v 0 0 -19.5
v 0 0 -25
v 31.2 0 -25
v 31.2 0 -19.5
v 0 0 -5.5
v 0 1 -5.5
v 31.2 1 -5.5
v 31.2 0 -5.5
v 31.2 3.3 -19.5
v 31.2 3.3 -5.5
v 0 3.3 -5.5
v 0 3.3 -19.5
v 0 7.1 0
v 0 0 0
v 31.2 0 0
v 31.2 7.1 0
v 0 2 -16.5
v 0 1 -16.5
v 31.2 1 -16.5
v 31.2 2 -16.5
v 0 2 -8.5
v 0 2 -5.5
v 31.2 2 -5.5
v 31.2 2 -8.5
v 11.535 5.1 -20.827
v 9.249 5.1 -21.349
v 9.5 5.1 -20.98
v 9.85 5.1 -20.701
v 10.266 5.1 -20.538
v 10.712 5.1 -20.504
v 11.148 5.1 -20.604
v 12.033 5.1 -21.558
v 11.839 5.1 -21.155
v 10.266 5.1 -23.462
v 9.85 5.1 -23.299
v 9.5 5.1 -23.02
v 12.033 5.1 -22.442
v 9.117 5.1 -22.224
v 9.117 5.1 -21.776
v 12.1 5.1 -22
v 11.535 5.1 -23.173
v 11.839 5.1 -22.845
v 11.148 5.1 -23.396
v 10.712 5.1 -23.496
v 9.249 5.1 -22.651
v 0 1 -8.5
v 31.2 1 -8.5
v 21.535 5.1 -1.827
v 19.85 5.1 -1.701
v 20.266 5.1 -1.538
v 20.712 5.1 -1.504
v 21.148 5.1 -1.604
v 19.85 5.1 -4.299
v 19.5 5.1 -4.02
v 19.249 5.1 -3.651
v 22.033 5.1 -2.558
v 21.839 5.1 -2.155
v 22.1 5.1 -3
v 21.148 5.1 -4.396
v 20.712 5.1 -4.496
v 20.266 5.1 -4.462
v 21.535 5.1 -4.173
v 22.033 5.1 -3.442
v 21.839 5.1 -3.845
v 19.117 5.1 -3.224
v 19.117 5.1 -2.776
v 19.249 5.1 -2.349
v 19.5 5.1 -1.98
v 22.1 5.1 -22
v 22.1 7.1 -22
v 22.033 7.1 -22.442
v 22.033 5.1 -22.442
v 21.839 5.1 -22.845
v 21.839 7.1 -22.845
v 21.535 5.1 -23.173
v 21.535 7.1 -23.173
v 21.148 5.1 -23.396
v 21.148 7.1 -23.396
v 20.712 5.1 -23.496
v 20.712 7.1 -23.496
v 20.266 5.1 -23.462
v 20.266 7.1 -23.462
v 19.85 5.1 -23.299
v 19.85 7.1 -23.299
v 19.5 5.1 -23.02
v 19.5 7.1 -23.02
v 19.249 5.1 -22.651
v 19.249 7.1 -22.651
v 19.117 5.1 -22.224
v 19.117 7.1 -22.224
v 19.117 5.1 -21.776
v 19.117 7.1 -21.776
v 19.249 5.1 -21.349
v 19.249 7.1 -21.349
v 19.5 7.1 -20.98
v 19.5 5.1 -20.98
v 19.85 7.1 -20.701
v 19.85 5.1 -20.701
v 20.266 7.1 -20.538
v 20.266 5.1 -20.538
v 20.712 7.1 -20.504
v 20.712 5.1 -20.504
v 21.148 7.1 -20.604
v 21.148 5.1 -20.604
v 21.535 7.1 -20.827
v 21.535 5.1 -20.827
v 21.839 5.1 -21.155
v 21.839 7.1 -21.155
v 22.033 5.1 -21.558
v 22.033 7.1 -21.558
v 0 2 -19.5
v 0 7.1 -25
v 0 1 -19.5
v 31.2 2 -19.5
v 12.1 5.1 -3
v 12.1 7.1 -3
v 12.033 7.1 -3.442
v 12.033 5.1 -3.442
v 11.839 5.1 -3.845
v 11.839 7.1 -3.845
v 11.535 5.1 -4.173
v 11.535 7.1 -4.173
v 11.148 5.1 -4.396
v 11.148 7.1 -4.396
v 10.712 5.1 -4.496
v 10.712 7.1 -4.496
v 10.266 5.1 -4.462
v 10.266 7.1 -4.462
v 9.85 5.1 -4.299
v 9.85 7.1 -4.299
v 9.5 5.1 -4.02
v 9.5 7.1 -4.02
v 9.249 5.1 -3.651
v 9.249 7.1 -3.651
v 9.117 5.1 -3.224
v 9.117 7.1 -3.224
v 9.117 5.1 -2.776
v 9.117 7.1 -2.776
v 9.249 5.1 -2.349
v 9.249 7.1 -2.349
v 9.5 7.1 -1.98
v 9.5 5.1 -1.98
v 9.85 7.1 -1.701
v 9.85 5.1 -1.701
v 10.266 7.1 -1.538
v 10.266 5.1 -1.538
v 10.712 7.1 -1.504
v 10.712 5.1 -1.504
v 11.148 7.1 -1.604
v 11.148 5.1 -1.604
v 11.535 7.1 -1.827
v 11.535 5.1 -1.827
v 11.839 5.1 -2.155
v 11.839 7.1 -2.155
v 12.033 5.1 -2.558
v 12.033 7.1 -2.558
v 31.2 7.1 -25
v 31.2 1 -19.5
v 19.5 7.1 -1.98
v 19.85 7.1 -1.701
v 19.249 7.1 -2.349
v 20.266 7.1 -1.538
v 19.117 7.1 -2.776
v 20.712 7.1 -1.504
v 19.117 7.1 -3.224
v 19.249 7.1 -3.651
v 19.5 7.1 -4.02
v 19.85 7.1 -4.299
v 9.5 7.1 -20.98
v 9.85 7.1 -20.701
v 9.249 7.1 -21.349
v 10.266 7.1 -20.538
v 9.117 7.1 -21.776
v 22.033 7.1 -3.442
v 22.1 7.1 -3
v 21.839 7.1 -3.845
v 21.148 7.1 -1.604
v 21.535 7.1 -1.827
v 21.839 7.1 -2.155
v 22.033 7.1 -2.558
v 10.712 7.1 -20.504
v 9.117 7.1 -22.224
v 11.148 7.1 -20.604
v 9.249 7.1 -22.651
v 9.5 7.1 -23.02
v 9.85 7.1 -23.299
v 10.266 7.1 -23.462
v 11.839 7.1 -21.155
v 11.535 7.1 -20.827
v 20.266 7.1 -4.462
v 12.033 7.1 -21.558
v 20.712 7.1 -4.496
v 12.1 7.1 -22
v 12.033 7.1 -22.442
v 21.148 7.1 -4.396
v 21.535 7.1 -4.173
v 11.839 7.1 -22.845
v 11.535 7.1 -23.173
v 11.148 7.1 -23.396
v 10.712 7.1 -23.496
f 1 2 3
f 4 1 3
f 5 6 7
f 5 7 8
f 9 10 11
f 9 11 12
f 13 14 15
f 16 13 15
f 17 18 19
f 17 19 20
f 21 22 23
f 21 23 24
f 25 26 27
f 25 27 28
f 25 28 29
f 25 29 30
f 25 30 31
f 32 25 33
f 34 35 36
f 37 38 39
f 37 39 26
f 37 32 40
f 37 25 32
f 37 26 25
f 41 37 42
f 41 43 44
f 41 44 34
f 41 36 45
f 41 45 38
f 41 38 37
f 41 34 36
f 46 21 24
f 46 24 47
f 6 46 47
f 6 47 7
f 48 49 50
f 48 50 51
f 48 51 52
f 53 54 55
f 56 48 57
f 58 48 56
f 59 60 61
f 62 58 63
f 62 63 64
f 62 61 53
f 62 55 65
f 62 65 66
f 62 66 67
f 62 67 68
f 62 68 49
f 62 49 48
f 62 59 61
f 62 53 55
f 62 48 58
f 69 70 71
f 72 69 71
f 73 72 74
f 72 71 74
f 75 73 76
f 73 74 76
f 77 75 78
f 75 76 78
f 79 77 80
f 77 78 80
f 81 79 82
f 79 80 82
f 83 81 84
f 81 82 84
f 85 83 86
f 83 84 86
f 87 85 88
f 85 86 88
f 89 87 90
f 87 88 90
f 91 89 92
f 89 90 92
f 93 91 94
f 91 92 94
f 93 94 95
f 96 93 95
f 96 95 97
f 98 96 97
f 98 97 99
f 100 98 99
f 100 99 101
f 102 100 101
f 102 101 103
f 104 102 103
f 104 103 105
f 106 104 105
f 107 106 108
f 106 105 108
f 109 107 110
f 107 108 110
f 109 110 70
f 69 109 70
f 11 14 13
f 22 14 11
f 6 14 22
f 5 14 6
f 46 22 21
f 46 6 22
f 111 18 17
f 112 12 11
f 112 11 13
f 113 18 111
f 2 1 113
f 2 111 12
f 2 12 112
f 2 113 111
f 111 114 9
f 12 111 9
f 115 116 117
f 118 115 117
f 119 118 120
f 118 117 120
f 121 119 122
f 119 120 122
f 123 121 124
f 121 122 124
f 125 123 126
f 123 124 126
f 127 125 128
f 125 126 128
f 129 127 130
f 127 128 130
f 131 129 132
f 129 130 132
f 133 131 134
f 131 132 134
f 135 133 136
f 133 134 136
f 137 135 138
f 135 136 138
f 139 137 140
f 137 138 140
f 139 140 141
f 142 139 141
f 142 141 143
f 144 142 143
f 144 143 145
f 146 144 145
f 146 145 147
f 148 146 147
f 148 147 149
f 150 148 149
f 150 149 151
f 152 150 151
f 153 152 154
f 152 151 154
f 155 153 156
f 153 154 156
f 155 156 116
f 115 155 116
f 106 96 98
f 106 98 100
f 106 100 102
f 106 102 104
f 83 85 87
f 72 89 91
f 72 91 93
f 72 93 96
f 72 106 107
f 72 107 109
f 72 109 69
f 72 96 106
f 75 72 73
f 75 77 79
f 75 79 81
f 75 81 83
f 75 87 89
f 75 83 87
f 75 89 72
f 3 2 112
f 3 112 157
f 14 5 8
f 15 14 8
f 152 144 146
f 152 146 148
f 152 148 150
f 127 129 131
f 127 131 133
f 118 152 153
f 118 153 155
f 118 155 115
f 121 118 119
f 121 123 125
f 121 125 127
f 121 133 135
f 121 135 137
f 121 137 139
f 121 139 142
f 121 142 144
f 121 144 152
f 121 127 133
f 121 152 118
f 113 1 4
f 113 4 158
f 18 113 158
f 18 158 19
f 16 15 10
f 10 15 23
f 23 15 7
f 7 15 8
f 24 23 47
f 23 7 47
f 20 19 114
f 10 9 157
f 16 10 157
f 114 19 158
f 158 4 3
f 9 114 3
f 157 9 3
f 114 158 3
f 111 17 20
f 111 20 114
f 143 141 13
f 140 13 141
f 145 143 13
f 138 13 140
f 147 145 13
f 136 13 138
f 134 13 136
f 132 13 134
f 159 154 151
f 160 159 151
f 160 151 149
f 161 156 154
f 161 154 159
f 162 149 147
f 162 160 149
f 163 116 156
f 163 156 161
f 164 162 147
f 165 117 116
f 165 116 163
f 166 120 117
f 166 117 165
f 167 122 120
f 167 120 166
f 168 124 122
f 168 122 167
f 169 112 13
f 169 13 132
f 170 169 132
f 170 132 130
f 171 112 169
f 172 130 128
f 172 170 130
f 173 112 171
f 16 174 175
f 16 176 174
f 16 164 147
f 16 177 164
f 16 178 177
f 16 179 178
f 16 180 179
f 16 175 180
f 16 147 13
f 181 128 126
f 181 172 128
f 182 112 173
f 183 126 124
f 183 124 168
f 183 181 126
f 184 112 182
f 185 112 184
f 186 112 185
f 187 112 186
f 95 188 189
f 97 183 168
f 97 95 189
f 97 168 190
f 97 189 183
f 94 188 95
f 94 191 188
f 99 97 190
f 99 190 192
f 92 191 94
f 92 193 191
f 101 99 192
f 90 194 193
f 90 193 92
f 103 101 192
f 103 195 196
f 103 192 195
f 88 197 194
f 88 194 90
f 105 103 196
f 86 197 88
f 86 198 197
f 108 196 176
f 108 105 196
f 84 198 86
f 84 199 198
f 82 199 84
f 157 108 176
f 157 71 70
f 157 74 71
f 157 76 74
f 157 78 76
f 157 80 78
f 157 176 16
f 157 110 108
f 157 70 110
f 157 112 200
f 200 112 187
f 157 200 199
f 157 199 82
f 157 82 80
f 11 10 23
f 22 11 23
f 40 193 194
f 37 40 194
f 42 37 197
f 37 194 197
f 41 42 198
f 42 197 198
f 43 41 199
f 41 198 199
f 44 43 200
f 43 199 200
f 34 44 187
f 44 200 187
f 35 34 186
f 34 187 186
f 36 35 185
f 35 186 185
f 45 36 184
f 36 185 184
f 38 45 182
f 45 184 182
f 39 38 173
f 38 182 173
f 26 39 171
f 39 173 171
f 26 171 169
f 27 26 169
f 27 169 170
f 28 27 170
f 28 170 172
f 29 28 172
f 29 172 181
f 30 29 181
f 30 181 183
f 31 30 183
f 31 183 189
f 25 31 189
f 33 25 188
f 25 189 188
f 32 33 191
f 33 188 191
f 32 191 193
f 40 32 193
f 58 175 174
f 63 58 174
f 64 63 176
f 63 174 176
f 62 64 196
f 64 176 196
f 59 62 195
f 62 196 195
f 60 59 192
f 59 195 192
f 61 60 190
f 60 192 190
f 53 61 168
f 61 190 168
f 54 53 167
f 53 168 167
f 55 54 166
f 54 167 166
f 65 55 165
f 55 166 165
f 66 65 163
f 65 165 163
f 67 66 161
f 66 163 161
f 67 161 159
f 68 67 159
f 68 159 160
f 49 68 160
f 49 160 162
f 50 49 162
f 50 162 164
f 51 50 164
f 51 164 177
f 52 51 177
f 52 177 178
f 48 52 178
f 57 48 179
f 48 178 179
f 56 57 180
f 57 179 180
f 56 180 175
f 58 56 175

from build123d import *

# Parameters (mm, degrees)
SKETCH_1_W          = 31.2
SKETCH_1_H          = 25
EXTRUDE_1_DEPTH     = 7.1
CUT_EXTRUDE_1_DEPTH = 50.9
SKETCH_3_R          = 1.5
CUT_EXTRUDE_9_DEPTH = 2


with BuildPart() as part:
    # 草图1 → 凸台-拉伸1 (new body)
    with BuildSketch(Plane(origin=(0, 0, 0), x_dir=(1, 0, 0), z_dir=(0, 1, 0))):
        with Locations((15.6, 12.5)):
            Rectangle(SKETCH_1_W, SKETCH_1_H)
    extrude(amount=EXTRUDE_1_DEPTH)

    # 草图2 → 切除-拉伸1 (cut)
    with BuildSketch(Plane.ZY):
        Polygon((-19.5, 0), (-19.5, 1), (-16.5, 1), (-16.5, 2), (-19.5, 2), (-19.5, 3.3), (-12.5, 3.3), (-5.5, 3.3), (-5.5, 2), (-8.5, 2), (-8.5, 1), (-5.5, 1), (-5.5, 0), align=None)
    extrude(amount=-CUT_EXTRUDE_1_DEPTH, mode=Mode.SUBTRACT)

    # 草图3 → 切除-拉伸9 (cut)
    with BuildSketch(Plane(origin=(0, 7.1, 0), x_dir=(1, 0, 0), z_dir=(0, 1, 0))):
        with Locations((10.6, 22)):
            Circle(SKETCH_3_R)
        with Locations((20.6, 22)):
            Circle(SKETCH_3_R)
        with Locations((20.6, 3)):
            Circle(SKETCH_3_R)
        with Locations((10.6, 3)):
            Circle(SKETCH_3_R)
    extrude(amount=-CUT_EXTRUDE_9_DEPTH, mode=Mode.SUBTRACT)


solid = part.part
